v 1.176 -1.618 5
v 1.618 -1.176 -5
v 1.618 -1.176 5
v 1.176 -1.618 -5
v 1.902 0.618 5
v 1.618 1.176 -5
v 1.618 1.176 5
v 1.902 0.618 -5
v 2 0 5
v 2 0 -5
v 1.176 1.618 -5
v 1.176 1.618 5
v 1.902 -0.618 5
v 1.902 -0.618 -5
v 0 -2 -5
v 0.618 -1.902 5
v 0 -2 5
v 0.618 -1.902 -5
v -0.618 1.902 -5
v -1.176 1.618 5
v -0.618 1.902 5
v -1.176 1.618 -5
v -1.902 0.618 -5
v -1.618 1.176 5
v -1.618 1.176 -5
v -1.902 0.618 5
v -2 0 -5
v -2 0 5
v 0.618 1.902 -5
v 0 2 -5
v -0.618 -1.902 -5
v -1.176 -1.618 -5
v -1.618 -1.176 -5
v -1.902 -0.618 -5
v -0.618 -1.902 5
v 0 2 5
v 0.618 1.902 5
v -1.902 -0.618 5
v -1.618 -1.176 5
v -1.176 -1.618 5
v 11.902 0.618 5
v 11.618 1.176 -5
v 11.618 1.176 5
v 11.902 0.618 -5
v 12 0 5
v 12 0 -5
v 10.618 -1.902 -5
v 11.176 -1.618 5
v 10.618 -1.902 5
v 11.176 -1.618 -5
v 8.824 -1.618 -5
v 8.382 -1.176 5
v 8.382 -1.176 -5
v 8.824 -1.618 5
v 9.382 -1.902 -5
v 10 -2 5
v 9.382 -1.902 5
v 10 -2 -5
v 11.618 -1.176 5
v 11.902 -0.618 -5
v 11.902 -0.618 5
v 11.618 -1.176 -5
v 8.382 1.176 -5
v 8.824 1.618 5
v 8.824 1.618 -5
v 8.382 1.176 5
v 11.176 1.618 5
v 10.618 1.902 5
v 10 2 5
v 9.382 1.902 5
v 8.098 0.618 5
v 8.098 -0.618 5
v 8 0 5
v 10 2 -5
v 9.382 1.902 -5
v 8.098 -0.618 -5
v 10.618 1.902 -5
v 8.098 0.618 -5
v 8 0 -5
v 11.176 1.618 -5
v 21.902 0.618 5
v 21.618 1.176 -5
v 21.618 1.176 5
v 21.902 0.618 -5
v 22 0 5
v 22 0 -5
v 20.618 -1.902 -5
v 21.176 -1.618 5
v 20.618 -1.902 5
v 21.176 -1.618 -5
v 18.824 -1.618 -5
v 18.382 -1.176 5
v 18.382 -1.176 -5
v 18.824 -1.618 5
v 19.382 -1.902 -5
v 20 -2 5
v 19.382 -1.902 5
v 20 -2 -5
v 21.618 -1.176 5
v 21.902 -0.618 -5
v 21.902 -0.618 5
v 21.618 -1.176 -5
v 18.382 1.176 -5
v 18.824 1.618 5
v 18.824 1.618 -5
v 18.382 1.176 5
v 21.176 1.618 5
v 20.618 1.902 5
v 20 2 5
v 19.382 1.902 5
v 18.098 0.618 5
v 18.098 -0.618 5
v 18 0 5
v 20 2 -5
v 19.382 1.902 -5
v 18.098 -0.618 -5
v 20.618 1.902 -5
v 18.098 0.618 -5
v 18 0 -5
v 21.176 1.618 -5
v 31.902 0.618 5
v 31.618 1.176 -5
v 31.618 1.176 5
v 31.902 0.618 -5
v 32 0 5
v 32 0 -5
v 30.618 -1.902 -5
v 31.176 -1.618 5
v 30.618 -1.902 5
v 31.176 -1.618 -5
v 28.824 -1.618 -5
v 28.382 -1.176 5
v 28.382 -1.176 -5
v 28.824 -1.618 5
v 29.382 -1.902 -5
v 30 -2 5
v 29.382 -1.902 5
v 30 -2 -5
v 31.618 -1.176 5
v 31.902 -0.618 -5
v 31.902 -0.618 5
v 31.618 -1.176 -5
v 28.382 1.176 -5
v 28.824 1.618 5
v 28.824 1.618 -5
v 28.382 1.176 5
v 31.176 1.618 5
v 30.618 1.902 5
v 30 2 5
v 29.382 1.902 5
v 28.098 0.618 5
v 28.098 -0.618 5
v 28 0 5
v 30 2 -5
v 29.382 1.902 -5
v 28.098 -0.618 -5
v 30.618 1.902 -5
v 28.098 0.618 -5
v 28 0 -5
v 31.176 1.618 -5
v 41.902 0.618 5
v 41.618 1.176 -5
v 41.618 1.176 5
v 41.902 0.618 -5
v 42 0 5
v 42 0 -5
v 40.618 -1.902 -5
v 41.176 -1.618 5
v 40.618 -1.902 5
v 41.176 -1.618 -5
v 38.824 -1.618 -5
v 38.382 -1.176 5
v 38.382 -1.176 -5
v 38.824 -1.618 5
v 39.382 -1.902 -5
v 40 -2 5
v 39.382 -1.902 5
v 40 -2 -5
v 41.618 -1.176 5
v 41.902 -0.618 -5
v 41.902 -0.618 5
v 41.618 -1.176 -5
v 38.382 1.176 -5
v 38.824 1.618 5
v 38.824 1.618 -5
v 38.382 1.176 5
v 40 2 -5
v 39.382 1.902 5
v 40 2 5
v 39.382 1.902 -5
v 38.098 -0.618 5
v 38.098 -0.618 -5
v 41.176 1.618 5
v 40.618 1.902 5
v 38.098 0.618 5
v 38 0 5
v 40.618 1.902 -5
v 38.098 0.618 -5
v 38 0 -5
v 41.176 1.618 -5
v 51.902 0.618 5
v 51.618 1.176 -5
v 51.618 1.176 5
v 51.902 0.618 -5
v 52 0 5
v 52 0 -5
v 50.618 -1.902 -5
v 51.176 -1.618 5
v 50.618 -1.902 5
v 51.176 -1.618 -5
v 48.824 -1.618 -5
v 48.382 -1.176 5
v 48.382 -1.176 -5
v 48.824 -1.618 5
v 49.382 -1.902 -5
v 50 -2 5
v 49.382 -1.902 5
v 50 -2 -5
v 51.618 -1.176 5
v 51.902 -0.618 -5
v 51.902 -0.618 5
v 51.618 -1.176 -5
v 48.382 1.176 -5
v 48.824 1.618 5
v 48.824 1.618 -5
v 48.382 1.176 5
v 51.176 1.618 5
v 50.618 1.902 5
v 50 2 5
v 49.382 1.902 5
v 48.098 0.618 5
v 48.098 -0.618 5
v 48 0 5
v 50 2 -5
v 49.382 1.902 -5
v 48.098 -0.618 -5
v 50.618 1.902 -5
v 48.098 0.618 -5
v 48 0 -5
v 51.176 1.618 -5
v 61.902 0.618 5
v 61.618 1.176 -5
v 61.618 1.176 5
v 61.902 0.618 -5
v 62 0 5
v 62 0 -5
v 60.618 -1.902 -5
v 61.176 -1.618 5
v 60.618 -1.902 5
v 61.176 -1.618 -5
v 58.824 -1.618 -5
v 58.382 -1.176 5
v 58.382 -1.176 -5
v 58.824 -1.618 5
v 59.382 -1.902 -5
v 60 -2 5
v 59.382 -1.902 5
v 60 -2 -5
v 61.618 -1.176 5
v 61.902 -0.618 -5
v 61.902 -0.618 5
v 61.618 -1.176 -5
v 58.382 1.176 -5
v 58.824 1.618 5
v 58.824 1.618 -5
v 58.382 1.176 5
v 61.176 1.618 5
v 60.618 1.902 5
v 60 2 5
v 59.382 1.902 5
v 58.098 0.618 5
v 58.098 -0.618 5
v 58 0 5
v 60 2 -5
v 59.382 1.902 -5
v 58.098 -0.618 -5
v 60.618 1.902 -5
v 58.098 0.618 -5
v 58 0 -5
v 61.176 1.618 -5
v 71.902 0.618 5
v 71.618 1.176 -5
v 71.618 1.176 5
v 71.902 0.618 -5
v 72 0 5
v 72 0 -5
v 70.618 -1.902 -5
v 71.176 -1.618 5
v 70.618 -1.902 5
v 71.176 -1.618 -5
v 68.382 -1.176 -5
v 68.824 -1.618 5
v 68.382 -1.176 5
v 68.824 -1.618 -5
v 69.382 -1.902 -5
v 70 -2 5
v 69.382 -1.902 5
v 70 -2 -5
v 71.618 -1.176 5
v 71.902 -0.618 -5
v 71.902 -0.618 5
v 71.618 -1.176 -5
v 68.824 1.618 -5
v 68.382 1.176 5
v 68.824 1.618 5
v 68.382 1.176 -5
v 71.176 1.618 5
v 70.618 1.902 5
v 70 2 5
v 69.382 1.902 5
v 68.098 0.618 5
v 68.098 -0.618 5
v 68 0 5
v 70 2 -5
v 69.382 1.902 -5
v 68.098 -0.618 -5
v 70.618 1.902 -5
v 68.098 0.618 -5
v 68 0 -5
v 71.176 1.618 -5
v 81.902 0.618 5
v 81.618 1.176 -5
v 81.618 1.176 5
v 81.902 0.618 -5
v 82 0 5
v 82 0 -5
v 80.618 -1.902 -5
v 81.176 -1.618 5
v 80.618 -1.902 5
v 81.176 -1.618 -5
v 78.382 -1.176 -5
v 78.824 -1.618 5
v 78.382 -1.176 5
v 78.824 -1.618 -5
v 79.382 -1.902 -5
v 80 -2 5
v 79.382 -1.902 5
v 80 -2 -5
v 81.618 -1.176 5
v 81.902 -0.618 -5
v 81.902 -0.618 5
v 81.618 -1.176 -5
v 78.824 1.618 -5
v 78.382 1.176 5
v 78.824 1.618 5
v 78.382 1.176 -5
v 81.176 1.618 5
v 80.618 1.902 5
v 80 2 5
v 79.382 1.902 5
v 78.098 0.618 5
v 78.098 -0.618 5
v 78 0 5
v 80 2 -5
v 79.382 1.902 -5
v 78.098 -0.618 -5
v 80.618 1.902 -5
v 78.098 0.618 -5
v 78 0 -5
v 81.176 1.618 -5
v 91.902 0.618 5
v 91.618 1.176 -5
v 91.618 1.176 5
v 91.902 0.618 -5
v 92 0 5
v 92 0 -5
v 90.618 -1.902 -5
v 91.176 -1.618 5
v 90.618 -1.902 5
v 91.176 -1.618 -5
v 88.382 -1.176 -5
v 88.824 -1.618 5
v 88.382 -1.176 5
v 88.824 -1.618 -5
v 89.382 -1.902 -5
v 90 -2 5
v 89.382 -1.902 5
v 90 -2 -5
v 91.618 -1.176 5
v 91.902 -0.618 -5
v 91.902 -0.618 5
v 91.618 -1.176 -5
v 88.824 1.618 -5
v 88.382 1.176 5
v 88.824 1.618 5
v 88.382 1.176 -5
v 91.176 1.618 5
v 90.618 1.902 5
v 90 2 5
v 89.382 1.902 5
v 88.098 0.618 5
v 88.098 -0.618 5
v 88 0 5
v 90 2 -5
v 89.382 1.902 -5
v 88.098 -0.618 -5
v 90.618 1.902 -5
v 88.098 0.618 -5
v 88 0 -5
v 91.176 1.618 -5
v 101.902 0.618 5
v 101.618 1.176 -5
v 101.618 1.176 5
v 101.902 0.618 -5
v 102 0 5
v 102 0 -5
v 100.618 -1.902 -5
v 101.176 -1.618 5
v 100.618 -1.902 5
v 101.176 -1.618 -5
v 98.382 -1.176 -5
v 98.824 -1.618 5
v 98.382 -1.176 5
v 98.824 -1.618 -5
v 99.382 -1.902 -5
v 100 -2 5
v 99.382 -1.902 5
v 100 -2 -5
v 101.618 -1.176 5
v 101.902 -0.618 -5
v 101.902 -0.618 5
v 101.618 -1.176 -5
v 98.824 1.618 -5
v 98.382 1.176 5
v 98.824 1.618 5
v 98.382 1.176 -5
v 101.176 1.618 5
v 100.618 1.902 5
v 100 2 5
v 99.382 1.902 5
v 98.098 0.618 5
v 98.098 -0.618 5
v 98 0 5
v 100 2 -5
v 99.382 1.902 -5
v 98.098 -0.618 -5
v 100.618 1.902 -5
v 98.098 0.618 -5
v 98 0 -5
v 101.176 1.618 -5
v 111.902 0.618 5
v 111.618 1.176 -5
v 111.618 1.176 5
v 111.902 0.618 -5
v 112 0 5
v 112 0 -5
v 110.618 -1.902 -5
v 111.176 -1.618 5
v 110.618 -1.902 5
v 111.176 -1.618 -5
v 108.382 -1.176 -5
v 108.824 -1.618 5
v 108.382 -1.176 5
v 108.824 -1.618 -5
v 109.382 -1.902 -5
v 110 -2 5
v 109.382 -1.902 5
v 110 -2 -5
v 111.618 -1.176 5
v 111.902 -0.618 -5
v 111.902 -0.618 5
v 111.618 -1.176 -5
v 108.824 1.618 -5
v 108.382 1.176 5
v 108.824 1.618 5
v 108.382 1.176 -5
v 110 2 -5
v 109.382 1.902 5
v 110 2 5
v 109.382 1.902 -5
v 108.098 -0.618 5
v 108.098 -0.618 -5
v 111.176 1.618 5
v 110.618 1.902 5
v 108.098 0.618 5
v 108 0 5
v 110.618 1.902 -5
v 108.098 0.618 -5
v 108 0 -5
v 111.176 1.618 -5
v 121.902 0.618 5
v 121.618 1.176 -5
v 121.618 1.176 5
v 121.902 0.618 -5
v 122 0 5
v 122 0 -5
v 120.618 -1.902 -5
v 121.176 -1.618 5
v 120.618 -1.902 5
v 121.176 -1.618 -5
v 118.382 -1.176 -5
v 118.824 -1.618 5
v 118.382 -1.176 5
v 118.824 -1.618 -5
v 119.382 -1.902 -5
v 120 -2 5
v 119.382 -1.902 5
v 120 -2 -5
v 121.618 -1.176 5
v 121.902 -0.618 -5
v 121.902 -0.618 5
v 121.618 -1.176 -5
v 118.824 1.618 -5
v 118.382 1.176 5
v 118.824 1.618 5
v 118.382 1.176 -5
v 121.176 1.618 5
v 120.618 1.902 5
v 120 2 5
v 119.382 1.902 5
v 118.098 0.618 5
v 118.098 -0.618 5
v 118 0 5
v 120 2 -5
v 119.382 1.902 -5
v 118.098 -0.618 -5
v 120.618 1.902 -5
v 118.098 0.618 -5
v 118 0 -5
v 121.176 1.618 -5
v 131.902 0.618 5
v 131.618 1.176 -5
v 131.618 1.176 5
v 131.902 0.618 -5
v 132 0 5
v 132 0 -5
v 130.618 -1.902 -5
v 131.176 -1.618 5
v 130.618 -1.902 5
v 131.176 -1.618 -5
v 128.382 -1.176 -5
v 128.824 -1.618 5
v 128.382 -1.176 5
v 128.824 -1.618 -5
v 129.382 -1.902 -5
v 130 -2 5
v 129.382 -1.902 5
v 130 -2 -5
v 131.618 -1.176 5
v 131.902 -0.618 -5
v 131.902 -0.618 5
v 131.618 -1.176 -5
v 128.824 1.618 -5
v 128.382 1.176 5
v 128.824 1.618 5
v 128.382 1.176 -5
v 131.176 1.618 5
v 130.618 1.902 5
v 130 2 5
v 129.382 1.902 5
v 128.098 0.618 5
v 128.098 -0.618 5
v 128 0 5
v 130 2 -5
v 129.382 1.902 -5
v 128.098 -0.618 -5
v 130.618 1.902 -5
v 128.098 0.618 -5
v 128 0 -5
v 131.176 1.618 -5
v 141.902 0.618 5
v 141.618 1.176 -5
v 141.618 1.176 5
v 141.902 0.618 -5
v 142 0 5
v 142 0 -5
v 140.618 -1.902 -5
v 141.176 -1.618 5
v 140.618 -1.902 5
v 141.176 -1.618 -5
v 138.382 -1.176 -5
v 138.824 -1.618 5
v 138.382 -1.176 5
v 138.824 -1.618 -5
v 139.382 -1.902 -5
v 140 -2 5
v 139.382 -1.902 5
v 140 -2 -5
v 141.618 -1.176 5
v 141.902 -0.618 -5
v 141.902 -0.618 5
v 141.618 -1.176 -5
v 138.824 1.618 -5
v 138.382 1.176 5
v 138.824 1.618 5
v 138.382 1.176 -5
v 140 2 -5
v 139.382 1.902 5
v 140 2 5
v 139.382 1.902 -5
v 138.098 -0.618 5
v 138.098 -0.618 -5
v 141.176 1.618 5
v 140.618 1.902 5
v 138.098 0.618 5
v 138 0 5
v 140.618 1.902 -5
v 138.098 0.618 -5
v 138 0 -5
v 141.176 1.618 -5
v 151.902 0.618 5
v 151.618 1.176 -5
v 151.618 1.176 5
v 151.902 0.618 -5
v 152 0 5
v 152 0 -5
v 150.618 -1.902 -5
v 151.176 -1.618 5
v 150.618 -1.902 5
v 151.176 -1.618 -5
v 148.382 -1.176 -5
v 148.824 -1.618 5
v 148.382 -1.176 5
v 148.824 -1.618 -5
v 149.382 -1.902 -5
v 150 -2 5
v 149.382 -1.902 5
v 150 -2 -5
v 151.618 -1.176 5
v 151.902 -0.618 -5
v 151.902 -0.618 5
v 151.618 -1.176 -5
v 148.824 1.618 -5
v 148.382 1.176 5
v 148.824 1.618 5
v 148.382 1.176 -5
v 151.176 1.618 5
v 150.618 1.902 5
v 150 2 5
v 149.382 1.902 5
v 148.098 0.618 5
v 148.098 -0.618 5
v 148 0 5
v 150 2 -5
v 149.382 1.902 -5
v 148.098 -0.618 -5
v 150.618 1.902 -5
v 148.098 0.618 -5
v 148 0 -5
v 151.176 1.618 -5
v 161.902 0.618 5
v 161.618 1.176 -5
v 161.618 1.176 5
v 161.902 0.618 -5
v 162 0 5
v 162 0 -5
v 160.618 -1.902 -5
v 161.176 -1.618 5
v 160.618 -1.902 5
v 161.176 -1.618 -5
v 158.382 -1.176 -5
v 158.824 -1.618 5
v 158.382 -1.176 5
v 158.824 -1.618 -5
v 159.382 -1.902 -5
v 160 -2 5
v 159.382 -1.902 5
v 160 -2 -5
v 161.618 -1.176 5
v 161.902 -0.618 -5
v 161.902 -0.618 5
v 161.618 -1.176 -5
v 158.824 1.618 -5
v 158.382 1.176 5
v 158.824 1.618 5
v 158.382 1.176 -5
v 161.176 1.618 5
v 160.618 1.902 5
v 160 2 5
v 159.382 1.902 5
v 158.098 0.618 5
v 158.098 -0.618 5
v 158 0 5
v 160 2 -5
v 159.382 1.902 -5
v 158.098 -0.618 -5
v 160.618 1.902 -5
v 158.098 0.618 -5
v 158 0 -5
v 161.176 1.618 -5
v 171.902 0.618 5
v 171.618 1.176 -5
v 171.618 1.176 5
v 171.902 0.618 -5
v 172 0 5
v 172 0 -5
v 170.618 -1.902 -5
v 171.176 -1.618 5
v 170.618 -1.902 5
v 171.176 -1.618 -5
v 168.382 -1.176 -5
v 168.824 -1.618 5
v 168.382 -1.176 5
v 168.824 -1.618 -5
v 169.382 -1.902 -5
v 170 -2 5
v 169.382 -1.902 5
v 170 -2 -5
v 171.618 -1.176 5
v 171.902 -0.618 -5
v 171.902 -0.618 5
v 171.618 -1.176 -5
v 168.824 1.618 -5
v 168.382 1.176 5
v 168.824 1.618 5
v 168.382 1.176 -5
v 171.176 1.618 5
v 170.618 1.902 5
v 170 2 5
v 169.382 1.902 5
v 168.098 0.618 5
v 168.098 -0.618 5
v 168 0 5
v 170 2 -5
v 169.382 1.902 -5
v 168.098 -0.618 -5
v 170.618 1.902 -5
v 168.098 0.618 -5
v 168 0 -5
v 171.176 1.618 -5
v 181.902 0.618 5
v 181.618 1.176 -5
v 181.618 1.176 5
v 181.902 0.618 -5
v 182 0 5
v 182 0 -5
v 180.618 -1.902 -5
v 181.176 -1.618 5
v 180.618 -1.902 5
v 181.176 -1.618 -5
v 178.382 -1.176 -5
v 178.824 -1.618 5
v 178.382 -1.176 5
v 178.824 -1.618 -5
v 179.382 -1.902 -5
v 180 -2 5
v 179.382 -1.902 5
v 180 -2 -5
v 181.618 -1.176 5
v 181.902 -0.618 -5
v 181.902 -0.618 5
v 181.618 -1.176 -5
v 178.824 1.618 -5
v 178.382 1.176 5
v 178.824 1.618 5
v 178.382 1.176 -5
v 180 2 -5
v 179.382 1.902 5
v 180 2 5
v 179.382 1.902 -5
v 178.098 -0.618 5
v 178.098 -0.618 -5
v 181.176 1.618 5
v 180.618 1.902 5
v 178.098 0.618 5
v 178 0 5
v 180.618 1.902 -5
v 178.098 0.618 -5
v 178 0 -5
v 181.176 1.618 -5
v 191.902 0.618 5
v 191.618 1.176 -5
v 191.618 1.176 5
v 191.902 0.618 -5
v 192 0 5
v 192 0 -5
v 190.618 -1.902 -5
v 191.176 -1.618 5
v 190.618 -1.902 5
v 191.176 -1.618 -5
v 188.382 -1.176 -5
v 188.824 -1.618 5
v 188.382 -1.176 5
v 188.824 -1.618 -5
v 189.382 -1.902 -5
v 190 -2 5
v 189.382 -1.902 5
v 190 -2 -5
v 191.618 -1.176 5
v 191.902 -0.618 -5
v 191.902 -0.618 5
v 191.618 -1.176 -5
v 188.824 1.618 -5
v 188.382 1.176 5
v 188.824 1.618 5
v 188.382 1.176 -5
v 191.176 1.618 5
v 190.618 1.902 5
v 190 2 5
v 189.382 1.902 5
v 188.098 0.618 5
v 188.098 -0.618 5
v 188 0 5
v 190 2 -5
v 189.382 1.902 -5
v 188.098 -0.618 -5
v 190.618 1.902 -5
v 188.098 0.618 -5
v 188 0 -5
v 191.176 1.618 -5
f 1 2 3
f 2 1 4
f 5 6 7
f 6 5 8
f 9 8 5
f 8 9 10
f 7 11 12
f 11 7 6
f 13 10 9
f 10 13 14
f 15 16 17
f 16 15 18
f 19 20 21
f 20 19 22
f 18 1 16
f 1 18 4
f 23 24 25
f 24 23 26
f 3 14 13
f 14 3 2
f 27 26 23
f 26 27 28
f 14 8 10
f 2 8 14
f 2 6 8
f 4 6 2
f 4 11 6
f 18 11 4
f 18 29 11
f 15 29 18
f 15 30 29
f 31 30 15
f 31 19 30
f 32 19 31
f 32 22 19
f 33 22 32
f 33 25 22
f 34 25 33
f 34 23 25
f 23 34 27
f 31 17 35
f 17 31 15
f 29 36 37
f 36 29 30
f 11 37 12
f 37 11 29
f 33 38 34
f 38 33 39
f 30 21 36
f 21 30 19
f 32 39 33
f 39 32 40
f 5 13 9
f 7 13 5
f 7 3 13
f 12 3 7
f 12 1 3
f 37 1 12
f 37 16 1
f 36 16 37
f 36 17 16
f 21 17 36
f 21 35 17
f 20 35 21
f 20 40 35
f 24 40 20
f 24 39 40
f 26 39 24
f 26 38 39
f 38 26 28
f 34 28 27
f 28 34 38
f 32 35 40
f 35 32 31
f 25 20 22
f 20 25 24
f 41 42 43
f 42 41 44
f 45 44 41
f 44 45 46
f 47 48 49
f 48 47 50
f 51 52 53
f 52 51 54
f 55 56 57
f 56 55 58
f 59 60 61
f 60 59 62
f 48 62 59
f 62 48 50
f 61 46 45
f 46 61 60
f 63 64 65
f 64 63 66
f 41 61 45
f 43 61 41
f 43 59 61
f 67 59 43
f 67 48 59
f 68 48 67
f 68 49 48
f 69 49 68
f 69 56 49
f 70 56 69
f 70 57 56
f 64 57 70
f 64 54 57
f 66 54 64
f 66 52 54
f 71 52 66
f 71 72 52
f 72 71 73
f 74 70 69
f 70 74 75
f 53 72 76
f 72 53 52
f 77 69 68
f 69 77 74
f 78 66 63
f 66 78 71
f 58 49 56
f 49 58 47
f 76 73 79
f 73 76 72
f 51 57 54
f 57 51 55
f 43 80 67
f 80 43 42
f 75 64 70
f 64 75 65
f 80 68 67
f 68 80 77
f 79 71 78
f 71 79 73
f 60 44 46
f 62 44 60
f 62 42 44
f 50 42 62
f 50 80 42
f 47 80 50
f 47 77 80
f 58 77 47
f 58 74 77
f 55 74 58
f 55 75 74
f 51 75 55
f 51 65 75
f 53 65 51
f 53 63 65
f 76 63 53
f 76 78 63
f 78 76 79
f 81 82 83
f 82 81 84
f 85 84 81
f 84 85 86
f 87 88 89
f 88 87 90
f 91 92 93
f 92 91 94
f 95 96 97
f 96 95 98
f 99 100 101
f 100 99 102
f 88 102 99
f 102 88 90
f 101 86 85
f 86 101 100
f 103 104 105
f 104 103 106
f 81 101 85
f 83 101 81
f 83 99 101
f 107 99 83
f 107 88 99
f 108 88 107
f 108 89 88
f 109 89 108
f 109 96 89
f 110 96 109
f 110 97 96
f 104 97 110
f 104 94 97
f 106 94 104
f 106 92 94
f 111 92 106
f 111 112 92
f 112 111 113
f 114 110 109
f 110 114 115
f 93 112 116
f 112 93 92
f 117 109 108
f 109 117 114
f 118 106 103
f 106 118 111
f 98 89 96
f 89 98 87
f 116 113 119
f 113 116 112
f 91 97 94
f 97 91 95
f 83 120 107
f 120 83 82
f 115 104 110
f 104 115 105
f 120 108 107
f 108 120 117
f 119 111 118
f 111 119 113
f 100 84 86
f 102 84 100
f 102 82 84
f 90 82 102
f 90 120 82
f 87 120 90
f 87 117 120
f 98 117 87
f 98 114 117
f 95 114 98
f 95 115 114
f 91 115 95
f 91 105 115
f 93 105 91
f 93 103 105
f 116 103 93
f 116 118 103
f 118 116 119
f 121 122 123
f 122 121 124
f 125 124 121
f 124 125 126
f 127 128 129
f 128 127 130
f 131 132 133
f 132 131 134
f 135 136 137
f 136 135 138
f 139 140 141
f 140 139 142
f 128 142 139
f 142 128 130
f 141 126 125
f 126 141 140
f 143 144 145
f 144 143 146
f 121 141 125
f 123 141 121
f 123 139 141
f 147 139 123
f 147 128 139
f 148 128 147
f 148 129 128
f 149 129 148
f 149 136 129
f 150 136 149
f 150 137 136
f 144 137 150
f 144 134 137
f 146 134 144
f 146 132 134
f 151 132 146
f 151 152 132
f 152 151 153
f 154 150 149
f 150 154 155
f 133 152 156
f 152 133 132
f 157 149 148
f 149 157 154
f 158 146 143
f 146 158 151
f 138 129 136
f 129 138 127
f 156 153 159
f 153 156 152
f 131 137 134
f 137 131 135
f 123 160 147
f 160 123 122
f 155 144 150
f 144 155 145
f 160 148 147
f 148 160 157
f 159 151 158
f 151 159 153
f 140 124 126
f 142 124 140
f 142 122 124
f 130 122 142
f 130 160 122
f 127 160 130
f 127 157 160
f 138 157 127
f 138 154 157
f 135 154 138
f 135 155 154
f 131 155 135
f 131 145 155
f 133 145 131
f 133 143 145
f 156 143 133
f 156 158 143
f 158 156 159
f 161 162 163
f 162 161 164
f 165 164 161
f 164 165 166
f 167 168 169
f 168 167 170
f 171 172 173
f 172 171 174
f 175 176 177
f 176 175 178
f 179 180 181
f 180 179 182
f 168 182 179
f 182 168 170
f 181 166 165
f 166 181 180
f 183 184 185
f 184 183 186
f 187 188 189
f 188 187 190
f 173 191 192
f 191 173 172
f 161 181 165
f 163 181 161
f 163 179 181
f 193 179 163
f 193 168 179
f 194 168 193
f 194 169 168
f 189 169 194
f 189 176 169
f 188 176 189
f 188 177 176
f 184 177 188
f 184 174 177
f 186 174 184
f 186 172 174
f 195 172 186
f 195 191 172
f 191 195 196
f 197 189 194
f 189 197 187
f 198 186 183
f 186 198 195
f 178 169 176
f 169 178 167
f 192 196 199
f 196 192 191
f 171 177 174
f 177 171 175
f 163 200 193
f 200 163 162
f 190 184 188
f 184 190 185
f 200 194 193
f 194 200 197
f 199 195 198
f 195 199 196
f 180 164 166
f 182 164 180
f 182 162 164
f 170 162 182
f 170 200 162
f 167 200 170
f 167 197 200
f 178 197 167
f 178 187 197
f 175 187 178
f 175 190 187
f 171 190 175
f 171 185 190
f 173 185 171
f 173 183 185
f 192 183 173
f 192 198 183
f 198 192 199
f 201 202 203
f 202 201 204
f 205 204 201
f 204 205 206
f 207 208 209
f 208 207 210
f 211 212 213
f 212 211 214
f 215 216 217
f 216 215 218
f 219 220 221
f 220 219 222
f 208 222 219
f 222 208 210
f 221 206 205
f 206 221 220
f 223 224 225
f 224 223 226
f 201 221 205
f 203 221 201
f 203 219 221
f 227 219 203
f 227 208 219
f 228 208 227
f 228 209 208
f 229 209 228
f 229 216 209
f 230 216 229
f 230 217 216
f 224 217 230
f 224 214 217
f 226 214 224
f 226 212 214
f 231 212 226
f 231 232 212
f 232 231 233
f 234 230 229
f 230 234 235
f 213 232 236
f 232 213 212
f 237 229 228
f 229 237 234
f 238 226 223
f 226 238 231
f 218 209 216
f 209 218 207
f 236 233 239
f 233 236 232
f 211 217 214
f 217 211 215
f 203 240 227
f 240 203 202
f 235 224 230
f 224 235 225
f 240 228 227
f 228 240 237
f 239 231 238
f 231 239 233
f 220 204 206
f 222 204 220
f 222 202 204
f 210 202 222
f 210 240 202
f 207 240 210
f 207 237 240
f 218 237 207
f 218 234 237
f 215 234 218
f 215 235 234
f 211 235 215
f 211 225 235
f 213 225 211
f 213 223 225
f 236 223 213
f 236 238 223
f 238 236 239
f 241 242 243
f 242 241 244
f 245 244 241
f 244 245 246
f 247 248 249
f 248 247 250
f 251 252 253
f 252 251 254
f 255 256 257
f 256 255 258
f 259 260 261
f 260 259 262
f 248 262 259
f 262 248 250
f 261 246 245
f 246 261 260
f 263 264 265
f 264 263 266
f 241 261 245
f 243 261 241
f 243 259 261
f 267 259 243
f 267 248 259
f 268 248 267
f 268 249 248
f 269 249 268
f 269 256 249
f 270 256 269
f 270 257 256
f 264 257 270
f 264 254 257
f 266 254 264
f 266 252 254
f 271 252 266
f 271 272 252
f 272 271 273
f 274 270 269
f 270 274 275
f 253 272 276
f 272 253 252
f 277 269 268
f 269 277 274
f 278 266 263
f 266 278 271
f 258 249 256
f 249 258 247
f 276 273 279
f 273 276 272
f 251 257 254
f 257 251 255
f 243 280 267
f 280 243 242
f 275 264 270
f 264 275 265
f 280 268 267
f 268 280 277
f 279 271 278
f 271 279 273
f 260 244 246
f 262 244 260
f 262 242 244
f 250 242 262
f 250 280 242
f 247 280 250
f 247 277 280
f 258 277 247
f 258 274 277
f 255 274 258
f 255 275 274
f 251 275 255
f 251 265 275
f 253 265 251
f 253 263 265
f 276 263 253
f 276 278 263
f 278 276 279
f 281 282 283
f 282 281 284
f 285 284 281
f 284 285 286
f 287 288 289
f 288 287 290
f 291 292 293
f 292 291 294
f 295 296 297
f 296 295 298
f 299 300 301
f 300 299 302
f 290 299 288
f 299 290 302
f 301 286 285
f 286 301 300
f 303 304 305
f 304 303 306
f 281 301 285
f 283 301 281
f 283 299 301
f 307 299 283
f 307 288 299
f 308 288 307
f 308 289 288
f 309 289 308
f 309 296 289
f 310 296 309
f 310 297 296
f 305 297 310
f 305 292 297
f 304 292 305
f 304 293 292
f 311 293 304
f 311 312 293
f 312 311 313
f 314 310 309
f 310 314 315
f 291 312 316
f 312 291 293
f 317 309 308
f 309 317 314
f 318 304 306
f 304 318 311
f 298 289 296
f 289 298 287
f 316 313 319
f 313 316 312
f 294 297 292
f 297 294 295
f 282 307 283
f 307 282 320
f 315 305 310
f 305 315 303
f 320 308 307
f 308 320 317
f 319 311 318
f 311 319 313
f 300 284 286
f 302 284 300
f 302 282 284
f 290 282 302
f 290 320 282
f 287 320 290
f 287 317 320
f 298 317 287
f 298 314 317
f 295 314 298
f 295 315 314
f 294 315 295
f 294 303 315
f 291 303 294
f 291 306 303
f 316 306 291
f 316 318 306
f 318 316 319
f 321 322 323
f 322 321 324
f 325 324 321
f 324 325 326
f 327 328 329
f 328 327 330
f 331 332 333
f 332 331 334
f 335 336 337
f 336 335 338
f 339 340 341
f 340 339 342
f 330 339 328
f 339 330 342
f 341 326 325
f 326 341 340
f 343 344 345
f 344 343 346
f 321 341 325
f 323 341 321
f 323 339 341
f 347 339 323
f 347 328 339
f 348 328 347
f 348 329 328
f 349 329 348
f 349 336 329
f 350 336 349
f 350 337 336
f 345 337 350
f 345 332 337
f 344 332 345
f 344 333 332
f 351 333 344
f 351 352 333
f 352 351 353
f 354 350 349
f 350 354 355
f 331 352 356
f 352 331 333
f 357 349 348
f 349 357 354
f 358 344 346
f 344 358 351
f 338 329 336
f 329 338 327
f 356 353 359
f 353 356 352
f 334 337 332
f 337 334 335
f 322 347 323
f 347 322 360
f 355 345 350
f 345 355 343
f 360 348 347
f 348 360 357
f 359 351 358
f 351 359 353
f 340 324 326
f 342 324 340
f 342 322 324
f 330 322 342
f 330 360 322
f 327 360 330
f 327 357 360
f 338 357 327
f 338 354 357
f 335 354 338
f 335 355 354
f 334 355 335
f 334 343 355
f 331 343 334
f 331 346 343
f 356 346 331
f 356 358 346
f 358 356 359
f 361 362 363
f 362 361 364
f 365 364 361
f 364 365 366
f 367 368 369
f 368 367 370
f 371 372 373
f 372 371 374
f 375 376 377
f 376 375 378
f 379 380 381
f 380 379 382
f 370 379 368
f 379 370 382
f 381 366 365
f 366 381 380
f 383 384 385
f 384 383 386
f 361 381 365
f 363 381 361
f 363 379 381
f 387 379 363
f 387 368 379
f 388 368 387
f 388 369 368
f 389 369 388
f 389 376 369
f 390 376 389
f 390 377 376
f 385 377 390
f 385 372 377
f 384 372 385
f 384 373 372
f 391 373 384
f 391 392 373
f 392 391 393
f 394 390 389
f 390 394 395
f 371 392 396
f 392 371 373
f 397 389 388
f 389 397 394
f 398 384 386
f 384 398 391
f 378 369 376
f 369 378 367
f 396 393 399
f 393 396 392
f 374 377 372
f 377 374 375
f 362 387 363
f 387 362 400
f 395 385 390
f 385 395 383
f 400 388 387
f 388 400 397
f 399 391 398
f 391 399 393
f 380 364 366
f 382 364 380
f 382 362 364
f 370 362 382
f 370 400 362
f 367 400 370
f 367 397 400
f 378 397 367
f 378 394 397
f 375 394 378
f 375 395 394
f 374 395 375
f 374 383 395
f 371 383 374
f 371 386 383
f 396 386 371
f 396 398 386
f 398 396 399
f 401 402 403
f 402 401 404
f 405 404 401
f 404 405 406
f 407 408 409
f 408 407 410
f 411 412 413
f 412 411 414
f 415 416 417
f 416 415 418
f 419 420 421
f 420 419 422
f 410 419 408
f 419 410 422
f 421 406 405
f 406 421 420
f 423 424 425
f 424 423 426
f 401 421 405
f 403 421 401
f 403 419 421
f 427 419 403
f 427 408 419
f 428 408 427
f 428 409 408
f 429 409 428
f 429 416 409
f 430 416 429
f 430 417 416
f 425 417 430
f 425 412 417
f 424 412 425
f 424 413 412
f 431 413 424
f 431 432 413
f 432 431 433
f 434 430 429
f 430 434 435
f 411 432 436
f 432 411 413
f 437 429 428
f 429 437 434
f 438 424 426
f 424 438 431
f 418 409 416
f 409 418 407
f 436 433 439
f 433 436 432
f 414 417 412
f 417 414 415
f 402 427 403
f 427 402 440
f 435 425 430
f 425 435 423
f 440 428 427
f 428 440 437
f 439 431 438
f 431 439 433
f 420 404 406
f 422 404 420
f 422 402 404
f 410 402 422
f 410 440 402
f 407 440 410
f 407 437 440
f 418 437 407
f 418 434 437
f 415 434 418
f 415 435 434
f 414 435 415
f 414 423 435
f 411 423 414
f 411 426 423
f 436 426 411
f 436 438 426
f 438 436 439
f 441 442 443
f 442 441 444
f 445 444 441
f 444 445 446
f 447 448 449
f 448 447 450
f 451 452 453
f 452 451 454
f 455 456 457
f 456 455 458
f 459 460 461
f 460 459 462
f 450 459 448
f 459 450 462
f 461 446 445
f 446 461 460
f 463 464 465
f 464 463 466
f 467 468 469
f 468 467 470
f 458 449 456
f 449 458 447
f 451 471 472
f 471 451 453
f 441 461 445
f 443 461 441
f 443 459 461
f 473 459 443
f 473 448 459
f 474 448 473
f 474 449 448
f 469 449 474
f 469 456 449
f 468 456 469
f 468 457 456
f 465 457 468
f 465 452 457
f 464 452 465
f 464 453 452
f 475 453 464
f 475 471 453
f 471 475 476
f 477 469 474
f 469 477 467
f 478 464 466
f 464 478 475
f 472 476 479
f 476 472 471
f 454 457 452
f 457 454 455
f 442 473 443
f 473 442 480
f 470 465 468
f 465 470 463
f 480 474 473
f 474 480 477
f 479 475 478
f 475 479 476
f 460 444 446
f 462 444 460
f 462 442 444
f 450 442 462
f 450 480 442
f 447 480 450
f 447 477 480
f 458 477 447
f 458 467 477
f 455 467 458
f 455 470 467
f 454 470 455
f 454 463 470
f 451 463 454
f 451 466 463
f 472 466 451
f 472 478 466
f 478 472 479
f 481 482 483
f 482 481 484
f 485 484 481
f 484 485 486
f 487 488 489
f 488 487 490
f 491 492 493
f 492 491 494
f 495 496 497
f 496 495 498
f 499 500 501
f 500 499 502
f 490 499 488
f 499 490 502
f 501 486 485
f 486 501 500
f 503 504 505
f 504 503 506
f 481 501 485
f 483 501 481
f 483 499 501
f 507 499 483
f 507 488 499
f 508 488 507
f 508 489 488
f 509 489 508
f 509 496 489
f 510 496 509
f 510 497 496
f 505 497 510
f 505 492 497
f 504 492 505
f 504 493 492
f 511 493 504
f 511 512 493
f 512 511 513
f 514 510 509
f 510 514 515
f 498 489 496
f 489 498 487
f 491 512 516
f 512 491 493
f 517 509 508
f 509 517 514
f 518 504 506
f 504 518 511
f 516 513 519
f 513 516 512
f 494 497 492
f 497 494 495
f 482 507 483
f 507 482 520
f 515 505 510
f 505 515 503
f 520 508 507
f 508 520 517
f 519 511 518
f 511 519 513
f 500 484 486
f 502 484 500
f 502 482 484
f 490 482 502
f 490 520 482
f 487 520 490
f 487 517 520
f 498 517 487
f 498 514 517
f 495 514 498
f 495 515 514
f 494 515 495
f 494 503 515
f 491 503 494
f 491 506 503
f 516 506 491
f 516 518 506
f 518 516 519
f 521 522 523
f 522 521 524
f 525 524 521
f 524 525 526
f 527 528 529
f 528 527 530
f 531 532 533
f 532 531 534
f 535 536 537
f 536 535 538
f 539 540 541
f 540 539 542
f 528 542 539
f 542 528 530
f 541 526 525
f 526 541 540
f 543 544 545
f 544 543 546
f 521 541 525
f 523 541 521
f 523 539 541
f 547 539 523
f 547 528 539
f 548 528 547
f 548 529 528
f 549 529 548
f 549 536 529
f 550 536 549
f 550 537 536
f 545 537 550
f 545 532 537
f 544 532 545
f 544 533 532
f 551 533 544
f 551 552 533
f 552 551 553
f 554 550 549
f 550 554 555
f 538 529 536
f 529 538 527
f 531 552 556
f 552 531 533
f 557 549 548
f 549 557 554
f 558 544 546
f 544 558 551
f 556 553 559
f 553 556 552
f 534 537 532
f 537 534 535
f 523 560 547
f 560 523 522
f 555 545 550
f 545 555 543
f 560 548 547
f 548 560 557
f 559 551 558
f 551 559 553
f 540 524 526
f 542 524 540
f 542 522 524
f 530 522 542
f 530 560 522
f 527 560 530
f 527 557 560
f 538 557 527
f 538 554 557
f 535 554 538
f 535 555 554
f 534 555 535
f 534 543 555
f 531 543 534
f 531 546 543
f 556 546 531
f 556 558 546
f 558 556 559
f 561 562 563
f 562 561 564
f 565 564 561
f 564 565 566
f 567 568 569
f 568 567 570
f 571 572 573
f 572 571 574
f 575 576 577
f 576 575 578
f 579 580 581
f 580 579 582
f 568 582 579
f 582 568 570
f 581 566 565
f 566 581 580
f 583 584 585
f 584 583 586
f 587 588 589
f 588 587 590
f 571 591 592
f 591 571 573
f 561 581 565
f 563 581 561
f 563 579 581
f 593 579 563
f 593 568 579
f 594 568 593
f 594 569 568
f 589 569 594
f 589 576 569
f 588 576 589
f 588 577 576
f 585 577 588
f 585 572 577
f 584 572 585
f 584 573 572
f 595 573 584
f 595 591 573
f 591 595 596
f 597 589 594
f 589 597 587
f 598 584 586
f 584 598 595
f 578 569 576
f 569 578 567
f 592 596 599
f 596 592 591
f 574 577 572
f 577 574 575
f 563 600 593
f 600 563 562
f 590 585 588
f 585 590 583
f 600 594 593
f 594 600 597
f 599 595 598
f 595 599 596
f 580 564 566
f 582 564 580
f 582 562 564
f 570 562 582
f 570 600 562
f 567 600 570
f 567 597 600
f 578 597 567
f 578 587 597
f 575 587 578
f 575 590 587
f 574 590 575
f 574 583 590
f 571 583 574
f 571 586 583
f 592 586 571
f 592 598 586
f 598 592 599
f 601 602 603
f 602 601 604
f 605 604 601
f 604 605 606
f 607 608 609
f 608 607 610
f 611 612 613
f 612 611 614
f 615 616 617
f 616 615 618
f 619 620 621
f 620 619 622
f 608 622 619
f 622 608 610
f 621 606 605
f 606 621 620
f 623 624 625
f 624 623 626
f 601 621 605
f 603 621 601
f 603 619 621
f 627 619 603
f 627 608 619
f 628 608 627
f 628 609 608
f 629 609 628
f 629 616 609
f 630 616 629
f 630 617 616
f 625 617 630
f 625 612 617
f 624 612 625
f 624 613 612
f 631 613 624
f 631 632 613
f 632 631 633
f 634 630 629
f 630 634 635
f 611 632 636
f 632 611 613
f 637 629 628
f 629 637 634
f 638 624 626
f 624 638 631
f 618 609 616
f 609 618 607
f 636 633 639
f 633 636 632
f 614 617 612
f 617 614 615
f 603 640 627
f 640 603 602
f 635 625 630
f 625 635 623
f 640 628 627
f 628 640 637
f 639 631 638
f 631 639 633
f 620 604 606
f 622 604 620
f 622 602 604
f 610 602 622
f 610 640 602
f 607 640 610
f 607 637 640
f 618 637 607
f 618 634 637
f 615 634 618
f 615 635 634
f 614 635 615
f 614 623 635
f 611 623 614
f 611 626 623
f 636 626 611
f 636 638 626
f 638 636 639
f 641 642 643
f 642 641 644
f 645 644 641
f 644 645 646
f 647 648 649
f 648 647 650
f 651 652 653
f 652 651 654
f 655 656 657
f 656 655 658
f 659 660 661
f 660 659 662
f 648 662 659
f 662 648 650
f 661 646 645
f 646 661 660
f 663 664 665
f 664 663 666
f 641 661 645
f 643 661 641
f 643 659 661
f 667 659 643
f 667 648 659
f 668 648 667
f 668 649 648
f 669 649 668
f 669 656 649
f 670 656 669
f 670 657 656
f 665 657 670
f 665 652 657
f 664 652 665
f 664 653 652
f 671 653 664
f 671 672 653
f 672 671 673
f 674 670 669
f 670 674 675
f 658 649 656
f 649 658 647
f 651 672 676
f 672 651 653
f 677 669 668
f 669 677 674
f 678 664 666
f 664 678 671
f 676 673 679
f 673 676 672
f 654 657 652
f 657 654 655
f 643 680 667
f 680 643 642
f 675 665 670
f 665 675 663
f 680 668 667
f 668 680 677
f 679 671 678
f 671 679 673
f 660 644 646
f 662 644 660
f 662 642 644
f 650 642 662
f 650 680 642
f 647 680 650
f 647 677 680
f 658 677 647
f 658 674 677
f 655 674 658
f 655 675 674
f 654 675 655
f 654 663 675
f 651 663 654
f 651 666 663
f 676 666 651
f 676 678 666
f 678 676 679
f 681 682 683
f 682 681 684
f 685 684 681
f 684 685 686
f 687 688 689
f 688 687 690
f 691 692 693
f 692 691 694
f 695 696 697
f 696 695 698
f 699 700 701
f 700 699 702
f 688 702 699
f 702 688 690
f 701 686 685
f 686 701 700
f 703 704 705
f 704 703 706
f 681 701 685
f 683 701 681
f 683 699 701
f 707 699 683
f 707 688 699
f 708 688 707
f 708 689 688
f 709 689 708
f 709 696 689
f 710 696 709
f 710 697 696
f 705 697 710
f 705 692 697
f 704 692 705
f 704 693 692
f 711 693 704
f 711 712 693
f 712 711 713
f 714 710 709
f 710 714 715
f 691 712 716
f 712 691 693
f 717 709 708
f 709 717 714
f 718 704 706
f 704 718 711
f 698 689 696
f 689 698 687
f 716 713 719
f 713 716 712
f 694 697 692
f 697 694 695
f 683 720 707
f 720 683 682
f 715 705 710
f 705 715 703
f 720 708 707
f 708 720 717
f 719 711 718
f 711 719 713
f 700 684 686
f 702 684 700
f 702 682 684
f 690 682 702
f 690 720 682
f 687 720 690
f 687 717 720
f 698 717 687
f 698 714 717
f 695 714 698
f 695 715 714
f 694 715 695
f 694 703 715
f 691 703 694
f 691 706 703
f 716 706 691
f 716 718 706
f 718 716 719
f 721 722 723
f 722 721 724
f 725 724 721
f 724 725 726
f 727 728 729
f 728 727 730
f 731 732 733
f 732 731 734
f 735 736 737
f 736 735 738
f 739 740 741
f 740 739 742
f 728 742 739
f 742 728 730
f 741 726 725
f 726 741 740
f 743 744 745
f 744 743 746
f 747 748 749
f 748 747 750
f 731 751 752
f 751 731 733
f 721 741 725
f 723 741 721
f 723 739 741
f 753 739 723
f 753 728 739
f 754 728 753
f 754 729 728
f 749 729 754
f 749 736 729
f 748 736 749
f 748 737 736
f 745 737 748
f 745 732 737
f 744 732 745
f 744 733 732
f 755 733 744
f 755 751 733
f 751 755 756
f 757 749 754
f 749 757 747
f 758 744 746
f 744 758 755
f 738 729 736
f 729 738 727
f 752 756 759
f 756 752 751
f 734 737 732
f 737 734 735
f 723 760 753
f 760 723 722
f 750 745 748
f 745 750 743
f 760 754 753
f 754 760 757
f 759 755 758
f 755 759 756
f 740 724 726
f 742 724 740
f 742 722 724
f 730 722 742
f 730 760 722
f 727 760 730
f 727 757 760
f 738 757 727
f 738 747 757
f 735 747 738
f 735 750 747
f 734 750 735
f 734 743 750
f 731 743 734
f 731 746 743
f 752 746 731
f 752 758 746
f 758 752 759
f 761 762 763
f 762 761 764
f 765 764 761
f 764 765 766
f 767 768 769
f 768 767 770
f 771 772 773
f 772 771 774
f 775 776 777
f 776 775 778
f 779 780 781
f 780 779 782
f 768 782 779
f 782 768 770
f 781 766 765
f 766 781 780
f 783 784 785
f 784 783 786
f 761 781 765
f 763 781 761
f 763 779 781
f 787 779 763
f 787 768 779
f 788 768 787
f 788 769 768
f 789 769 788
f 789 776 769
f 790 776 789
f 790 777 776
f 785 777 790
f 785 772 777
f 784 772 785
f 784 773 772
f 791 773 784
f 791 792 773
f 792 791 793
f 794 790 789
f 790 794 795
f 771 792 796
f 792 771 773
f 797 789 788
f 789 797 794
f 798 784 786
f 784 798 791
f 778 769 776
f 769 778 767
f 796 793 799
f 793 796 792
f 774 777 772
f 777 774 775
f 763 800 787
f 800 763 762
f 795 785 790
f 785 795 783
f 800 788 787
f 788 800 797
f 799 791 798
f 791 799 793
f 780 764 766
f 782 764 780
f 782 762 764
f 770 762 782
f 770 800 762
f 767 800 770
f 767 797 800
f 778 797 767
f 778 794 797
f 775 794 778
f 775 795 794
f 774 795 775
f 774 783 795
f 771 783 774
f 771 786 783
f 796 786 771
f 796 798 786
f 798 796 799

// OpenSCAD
//----------------------------------------------------------
//-- Tutorial OpenScad
//-- Juan Gonzalez-Gomez (Obijuan) juan@iearobotics.com
//----------------------------------------------------------
//-- (c) Mayo, 2012
//-- Licencia GPL
//----------------------------------------------------------
//-- Ejemplo de repeticion de tareas
//-- Se crea una tira variable de cilindros para hacer taladros
//----------------------------------------------------------

//-- Parametros de los cilindros
drill=4;
h1=10;
d=10;

//-- Numero de cilindros a crear
n = 20;

//-- Bucle: crear n cilindros trasladados a lo largo del eje x
for (i=[0:n-1]) {
  translate([i*d,0,0])
    cylinder(r=drill/2, h=h1, $fn=20,center=true);
}
